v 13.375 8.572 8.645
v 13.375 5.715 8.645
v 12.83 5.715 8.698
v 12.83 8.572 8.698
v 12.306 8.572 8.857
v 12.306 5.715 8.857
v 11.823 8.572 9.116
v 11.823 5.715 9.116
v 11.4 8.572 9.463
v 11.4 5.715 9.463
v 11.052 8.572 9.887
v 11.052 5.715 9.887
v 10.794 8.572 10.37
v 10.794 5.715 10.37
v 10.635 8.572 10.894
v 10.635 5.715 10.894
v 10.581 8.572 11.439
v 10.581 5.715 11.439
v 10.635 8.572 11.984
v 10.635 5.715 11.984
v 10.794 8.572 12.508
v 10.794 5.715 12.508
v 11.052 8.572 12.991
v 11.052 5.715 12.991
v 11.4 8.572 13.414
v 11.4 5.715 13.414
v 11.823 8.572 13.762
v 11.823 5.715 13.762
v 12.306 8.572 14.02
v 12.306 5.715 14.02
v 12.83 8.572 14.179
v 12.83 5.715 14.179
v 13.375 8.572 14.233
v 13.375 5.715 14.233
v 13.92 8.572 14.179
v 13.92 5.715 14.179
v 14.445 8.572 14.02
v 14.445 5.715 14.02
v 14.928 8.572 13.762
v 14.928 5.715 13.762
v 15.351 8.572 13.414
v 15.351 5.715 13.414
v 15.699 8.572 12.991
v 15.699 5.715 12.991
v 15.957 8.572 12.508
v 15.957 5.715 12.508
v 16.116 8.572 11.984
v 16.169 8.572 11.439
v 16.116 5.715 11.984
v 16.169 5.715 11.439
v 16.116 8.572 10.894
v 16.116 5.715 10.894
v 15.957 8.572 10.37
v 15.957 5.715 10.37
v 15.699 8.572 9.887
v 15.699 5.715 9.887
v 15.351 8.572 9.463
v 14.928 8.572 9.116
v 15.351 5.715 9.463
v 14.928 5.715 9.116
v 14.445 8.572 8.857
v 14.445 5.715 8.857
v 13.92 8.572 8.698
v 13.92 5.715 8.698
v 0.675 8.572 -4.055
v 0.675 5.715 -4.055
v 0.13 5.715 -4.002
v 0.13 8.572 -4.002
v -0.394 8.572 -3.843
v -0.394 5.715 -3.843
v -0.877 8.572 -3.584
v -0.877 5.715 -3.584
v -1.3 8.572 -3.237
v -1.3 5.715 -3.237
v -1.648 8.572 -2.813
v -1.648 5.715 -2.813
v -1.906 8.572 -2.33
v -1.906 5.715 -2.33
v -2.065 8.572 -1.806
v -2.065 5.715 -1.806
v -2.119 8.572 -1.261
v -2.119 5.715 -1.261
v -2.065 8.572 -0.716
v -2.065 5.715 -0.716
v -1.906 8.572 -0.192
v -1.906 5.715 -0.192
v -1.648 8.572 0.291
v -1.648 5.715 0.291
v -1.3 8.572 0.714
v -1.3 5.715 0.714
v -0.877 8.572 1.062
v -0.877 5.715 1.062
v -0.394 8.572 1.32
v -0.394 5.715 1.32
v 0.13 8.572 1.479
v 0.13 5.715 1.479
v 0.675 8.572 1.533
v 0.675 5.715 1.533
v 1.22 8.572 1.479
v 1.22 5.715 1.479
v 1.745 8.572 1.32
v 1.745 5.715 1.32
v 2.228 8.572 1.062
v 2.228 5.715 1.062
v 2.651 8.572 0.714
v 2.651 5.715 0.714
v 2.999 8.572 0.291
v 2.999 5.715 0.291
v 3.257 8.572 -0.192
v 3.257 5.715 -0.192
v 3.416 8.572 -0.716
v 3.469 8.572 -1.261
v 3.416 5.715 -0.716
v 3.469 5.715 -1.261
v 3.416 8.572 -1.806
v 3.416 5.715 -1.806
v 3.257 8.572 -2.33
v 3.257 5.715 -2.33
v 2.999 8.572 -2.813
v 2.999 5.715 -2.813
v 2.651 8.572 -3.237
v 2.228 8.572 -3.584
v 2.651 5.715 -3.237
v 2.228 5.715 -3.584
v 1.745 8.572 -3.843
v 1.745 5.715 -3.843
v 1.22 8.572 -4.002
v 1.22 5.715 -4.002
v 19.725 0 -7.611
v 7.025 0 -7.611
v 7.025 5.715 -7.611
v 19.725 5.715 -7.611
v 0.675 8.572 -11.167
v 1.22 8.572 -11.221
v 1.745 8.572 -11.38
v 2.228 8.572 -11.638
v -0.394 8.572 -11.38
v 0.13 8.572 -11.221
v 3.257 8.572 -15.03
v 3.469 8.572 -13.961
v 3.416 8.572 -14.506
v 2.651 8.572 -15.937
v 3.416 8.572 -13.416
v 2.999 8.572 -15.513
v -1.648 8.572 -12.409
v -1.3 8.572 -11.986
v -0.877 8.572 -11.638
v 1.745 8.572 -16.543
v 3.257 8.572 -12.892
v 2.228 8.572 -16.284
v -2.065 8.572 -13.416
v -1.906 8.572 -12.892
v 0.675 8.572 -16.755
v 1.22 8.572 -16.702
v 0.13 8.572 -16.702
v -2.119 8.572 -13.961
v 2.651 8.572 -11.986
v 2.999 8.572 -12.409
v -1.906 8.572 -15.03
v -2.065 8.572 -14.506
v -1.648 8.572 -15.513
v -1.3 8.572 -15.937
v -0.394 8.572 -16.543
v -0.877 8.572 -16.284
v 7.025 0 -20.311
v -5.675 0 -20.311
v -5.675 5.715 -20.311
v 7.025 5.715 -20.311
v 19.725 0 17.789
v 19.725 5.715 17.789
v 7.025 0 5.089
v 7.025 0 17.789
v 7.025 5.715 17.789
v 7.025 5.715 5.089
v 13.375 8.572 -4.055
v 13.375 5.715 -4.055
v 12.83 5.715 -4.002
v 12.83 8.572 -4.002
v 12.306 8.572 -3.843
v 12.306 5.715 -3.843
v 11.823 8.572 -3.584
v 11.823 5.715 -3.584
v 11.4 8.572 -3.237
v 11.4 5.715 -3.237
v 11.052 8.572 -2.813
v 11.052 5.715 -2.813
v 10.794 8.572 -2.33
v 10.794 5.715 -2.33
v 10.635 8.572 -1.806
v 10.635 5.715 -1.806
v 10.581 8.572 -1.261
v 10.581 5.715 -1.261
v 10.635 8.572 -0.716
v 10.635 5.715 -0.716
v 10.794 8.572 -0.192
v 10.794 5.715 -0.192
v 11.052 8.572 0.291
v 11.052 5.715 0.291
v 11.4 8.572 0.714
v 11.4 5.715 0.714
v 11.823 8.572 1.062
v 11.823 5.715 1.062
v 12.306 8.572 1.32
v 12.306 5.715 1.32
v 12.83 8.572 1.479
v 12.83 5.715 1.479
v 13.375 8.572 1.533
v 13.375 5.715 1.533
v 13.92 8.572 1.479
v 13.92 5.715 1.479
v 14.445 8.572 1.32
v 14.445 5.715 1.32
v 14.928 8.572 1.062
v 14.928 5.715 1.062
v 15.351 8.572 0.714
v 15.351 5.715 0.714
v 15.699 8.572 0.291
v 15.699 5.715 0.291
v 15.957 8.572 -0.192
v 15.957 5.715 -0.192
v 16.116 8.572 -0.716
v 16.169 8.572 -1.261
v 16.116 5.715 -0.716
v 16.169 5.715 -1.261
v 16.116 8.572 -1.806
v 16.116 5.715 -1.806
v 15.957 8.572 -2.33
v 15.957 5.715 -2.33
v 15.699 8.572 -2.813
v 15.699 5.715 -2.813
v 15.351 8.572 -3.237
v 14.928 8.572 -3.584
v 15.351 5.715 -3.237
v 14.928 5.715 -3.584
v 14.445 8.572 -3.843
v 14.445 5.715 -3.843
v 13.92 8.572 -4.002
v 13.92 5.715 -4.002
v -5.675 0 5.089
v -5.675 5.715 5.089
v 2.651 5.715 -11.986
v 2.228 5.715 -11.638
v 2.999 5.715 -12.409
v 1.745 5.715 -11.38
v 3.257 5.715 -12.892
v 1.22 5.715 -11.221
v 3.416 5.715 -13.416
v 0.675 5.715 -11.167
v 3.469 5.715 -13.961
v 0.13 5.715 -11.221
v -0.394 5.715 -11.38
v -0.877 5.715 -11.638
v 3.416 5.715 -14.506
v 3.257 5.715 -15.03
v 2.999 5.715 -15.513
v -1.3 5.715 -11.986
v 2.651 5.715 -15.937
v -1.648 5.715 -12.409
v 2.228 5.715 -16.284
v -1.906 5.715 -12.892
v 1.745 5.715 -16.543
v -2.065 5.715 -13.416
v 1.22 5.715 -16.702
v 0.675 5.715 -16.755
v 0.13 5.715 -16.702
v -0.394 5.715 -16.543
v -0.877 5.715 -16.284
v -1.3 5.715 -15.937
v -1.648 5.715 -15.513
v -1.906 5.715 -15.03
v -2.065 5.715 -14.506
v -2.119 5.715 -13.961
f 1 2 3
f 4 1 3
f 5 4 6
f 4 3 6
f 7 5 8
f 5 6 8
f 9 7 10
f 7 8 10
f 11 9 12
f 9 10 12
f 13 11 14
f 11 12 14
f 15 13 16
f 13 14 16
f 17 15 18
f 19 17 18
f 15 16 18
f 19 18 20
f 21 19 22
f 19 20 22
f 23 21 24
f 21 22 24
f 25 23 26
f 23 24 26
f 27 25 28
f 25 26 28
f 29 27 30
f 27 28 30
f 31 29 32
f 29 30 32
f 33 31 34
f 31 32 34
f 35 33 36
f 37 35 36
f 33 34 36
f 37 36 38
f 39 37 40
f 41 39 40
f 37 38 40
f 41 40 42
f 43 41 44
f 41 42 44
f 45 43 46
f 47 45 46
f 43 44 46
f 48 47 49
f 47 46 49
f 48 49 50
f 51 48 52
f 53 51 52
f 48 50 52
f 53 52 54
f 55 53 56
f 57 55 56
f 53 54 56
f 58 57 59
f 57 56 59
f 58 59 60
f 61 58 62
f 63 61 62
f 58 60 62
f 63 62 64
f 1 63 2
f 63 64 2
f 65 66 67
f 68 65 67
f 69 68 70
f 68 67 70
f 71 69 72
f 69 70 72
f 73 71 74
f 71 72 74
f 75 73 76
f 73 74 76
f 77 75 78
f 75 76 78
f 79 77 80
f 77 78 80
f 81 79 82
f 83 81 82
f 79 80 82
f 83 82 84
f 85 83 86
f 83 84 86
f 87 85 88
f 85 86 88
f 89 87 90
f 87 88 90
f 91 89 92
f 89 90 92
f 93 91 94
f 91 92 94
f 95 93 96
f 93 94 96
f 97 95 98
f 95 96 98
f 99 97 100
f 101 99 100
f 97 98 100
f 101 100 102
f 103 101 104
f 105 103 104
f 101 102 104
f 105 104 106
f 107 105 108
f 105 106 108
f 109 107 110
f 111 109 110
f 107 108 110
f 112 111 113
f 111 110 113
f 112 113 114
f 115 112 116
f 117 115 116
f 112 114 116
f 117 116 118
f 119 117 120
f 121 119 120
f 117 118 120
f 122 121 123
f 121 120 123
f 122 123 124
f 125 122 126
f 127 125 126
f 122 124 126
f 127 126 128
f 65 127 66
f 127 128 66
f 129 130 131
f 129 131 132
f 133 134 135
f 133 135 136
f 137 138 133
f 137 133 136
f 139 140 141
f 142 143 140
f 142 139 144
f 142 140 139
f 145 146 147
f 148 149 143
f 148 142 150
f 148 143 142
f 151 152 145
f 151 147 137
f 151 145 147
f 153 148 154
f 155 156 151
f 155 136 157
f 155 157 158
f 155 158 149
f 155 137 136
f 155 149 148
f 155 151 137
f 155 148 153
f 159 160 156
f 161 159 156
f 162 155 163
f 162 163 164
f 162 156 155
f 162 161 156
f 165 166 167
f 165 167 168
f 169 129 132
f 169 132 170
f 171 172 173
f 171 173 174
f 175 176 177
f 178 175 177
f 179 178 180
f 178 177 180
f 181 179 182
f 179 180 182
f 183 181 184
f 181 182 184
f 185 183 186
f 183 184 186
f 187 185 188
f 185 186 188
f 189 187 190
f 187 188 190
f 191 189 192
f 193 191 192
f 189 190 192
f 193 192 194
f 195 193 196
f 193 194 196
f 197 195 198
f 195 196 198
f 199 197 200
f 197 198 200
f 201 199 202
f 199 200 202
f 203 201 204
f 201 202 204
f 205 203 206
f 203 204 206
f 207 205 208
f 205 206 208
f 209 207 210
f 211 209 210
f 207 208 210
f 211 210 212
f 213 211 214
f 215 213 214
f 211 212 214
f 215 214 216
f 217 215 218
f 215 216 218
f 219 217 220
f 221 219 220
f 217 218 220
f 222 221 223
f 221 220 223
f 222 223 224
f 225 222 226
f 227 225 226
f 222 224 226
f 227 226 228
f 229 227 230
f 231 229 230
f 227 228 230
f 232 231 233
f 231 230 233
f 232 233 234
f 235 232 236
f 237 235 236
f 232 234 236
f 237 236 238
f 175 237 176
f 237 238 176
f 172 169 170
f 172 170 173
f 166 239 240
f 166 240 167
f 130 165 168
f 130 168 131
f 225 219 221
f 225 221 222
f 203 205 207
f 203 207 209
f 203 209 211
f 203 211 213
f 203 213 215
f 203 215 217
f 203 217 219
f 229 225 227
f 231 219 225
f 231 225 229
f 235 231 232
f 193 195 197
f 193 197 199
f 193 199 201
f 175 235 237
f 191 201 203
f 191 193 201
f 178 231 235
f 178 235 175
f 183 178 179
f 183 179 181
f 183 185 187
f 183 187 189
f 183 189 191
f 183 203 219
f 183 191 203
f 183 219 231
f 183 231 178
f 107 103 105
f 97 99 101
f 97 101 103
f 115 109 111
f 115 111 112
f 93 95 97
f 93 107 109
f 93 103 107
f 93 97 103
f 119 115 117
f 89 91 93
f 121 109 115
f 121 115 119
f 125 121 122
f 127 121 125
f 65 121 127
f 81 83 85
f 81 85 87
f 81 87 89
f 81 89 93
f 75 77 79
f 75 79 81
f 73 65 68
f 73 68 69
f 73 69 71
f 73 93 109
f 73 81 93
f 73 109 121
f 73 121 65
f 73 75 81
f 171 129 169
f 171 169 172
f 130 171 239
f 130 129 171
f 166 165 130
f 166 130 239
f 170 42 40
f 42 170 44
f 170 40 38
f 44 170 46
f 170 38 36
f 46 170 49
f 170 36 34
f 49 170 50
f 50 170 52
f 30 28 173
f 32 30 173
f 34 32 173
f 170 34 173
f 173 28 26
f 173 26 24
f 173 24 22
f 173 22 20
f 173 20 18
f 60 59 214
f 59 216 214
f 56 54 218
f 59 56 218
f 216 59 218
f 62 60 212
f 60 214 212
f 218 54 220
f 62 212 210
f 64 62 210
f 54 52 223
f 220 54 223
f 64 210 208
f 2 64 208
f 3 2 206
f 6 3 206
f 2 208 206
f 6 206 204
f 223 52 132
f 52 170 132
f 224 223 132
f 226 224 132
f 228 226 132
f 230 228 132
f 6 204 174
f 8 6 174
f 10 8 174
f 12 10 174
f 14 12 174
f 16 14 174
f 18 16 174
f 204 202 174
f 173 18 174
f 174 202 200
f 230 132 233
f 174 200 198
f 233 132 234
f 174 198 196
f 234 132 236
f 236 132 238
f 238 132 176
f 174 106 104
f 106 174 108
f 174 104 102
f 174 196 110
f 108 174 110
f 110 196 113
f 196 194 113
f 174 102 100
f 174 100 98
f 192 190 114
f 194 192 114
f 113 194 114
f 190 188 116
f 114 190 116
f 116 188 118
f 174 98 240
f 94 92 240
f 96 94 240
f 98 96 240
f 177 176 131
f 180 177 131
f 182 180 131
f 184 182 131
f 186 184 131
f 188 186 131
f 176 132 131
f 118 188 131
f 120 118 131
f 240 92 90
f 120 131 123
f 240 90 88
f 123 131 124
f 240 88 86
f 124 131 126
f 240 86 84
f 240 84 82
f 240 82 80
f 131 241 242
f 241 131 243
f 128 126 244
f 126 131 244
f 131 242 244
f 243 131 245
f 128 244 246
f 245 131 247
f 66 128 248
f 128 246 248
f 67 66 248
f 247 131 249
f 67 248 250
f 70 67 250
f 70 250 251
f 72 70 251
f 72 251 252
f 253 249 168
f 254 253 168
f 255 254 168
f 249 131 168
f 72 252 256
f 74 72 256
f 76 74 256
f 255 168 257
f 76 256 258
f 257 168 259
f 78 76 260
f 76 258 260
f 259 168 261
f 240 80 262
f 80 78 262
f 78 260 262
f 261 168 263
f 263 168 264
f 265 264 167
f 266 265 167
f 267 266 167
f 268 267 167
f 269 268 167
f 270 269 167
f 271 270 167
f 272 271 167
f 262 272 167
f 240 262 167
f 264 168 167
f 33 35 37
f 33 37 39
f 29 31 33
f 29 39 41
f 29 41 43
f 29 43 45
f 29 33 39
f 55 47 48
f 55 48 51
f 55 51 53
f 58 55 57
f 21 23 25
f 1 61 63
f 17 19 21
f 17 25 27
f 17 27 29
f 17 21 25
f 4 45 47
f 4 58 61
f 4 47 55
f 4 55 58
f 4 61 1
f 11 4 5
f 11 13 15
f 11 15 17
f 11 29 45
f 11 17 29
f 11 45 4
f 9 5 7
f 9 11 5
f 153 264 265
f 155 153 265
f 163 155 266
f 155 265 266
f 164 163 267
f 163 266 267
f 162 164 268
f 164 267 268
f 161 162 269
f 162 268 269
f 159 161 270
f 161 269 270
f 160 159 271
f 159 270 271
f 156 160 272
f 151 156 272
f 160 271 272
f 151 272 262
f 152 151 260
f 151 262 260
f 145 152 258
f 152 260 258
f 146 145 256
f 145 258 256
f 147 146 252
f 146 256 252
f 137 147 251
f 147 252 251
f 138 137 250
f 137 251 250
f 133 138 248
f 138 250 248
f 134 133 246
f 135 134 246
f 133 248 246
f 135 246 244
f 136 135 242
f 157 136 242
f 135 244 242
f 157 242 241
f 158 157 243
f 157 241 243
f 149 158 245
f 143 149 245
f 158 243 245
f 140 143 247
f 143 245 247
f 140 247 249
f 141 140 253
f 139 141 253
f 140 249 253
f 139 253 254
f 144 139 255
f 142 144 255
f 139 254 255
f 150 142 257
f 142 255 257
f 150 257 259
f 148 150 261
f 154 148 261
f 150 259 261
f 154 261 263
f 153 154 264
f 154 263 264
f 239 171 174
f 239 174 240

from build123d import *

# Parameters (mm, degrees)
BOSS_EXTRUDE1_DEPTH = 5.715
SKETCH2_R           = 2.794
BOSS_EXTRUDE3_DEPTH = 2.8575


with BuildPart() as part:
    # Sketch1 → Boss-Extrude1 (new body)
    with BuildSketch(Plane(origin=(0, 0, 0), x_dir=(1, 0, 0), z_dir=(0, 1, 0))):
        Polygon((-5.674598366, 20.311212687), (7.025401634, 20.311212687), (7.025401634, 7.611212687), (19.725401634, 7.611212687), (19.725401634, -17.788787313), (7.025401634, -17.788787313), (7.025401634, -5.088787313), (-5.674598366, -5.088787313), align=None)
    extrude(amount=BOSS_EXTRUDE1_DEPTH)

    # Sketch2 → Boss-Extrude3 (add)
    with BuildSketch(Plane(origin=(0, 5.715, 0), x_dir=(1, 0, 0), z_dir=(0, 1, 0))):
        with Locations(Location((0.675401634, 1.261212687, 0), (0, 0, 90))):
            Circle(SKETCH2_R)
        with Locations(Location((13.375401634, 1.261212687, 0), (0, 0, 90))):
            Circle(SKETCH2_R)
        with Locations(Location((0.675401634, 13.961212687, 0), (0, 0, 90))):
            Circle(SKETCH2_R)
        with Locations(Location((13.375401634, -11.438787313, 0), (0, 0, 90))):
            Circle(SKETCH2_R)
    extrude(amount=BOSS_EXTRUDE3_DEPTH)


solid = part.part
